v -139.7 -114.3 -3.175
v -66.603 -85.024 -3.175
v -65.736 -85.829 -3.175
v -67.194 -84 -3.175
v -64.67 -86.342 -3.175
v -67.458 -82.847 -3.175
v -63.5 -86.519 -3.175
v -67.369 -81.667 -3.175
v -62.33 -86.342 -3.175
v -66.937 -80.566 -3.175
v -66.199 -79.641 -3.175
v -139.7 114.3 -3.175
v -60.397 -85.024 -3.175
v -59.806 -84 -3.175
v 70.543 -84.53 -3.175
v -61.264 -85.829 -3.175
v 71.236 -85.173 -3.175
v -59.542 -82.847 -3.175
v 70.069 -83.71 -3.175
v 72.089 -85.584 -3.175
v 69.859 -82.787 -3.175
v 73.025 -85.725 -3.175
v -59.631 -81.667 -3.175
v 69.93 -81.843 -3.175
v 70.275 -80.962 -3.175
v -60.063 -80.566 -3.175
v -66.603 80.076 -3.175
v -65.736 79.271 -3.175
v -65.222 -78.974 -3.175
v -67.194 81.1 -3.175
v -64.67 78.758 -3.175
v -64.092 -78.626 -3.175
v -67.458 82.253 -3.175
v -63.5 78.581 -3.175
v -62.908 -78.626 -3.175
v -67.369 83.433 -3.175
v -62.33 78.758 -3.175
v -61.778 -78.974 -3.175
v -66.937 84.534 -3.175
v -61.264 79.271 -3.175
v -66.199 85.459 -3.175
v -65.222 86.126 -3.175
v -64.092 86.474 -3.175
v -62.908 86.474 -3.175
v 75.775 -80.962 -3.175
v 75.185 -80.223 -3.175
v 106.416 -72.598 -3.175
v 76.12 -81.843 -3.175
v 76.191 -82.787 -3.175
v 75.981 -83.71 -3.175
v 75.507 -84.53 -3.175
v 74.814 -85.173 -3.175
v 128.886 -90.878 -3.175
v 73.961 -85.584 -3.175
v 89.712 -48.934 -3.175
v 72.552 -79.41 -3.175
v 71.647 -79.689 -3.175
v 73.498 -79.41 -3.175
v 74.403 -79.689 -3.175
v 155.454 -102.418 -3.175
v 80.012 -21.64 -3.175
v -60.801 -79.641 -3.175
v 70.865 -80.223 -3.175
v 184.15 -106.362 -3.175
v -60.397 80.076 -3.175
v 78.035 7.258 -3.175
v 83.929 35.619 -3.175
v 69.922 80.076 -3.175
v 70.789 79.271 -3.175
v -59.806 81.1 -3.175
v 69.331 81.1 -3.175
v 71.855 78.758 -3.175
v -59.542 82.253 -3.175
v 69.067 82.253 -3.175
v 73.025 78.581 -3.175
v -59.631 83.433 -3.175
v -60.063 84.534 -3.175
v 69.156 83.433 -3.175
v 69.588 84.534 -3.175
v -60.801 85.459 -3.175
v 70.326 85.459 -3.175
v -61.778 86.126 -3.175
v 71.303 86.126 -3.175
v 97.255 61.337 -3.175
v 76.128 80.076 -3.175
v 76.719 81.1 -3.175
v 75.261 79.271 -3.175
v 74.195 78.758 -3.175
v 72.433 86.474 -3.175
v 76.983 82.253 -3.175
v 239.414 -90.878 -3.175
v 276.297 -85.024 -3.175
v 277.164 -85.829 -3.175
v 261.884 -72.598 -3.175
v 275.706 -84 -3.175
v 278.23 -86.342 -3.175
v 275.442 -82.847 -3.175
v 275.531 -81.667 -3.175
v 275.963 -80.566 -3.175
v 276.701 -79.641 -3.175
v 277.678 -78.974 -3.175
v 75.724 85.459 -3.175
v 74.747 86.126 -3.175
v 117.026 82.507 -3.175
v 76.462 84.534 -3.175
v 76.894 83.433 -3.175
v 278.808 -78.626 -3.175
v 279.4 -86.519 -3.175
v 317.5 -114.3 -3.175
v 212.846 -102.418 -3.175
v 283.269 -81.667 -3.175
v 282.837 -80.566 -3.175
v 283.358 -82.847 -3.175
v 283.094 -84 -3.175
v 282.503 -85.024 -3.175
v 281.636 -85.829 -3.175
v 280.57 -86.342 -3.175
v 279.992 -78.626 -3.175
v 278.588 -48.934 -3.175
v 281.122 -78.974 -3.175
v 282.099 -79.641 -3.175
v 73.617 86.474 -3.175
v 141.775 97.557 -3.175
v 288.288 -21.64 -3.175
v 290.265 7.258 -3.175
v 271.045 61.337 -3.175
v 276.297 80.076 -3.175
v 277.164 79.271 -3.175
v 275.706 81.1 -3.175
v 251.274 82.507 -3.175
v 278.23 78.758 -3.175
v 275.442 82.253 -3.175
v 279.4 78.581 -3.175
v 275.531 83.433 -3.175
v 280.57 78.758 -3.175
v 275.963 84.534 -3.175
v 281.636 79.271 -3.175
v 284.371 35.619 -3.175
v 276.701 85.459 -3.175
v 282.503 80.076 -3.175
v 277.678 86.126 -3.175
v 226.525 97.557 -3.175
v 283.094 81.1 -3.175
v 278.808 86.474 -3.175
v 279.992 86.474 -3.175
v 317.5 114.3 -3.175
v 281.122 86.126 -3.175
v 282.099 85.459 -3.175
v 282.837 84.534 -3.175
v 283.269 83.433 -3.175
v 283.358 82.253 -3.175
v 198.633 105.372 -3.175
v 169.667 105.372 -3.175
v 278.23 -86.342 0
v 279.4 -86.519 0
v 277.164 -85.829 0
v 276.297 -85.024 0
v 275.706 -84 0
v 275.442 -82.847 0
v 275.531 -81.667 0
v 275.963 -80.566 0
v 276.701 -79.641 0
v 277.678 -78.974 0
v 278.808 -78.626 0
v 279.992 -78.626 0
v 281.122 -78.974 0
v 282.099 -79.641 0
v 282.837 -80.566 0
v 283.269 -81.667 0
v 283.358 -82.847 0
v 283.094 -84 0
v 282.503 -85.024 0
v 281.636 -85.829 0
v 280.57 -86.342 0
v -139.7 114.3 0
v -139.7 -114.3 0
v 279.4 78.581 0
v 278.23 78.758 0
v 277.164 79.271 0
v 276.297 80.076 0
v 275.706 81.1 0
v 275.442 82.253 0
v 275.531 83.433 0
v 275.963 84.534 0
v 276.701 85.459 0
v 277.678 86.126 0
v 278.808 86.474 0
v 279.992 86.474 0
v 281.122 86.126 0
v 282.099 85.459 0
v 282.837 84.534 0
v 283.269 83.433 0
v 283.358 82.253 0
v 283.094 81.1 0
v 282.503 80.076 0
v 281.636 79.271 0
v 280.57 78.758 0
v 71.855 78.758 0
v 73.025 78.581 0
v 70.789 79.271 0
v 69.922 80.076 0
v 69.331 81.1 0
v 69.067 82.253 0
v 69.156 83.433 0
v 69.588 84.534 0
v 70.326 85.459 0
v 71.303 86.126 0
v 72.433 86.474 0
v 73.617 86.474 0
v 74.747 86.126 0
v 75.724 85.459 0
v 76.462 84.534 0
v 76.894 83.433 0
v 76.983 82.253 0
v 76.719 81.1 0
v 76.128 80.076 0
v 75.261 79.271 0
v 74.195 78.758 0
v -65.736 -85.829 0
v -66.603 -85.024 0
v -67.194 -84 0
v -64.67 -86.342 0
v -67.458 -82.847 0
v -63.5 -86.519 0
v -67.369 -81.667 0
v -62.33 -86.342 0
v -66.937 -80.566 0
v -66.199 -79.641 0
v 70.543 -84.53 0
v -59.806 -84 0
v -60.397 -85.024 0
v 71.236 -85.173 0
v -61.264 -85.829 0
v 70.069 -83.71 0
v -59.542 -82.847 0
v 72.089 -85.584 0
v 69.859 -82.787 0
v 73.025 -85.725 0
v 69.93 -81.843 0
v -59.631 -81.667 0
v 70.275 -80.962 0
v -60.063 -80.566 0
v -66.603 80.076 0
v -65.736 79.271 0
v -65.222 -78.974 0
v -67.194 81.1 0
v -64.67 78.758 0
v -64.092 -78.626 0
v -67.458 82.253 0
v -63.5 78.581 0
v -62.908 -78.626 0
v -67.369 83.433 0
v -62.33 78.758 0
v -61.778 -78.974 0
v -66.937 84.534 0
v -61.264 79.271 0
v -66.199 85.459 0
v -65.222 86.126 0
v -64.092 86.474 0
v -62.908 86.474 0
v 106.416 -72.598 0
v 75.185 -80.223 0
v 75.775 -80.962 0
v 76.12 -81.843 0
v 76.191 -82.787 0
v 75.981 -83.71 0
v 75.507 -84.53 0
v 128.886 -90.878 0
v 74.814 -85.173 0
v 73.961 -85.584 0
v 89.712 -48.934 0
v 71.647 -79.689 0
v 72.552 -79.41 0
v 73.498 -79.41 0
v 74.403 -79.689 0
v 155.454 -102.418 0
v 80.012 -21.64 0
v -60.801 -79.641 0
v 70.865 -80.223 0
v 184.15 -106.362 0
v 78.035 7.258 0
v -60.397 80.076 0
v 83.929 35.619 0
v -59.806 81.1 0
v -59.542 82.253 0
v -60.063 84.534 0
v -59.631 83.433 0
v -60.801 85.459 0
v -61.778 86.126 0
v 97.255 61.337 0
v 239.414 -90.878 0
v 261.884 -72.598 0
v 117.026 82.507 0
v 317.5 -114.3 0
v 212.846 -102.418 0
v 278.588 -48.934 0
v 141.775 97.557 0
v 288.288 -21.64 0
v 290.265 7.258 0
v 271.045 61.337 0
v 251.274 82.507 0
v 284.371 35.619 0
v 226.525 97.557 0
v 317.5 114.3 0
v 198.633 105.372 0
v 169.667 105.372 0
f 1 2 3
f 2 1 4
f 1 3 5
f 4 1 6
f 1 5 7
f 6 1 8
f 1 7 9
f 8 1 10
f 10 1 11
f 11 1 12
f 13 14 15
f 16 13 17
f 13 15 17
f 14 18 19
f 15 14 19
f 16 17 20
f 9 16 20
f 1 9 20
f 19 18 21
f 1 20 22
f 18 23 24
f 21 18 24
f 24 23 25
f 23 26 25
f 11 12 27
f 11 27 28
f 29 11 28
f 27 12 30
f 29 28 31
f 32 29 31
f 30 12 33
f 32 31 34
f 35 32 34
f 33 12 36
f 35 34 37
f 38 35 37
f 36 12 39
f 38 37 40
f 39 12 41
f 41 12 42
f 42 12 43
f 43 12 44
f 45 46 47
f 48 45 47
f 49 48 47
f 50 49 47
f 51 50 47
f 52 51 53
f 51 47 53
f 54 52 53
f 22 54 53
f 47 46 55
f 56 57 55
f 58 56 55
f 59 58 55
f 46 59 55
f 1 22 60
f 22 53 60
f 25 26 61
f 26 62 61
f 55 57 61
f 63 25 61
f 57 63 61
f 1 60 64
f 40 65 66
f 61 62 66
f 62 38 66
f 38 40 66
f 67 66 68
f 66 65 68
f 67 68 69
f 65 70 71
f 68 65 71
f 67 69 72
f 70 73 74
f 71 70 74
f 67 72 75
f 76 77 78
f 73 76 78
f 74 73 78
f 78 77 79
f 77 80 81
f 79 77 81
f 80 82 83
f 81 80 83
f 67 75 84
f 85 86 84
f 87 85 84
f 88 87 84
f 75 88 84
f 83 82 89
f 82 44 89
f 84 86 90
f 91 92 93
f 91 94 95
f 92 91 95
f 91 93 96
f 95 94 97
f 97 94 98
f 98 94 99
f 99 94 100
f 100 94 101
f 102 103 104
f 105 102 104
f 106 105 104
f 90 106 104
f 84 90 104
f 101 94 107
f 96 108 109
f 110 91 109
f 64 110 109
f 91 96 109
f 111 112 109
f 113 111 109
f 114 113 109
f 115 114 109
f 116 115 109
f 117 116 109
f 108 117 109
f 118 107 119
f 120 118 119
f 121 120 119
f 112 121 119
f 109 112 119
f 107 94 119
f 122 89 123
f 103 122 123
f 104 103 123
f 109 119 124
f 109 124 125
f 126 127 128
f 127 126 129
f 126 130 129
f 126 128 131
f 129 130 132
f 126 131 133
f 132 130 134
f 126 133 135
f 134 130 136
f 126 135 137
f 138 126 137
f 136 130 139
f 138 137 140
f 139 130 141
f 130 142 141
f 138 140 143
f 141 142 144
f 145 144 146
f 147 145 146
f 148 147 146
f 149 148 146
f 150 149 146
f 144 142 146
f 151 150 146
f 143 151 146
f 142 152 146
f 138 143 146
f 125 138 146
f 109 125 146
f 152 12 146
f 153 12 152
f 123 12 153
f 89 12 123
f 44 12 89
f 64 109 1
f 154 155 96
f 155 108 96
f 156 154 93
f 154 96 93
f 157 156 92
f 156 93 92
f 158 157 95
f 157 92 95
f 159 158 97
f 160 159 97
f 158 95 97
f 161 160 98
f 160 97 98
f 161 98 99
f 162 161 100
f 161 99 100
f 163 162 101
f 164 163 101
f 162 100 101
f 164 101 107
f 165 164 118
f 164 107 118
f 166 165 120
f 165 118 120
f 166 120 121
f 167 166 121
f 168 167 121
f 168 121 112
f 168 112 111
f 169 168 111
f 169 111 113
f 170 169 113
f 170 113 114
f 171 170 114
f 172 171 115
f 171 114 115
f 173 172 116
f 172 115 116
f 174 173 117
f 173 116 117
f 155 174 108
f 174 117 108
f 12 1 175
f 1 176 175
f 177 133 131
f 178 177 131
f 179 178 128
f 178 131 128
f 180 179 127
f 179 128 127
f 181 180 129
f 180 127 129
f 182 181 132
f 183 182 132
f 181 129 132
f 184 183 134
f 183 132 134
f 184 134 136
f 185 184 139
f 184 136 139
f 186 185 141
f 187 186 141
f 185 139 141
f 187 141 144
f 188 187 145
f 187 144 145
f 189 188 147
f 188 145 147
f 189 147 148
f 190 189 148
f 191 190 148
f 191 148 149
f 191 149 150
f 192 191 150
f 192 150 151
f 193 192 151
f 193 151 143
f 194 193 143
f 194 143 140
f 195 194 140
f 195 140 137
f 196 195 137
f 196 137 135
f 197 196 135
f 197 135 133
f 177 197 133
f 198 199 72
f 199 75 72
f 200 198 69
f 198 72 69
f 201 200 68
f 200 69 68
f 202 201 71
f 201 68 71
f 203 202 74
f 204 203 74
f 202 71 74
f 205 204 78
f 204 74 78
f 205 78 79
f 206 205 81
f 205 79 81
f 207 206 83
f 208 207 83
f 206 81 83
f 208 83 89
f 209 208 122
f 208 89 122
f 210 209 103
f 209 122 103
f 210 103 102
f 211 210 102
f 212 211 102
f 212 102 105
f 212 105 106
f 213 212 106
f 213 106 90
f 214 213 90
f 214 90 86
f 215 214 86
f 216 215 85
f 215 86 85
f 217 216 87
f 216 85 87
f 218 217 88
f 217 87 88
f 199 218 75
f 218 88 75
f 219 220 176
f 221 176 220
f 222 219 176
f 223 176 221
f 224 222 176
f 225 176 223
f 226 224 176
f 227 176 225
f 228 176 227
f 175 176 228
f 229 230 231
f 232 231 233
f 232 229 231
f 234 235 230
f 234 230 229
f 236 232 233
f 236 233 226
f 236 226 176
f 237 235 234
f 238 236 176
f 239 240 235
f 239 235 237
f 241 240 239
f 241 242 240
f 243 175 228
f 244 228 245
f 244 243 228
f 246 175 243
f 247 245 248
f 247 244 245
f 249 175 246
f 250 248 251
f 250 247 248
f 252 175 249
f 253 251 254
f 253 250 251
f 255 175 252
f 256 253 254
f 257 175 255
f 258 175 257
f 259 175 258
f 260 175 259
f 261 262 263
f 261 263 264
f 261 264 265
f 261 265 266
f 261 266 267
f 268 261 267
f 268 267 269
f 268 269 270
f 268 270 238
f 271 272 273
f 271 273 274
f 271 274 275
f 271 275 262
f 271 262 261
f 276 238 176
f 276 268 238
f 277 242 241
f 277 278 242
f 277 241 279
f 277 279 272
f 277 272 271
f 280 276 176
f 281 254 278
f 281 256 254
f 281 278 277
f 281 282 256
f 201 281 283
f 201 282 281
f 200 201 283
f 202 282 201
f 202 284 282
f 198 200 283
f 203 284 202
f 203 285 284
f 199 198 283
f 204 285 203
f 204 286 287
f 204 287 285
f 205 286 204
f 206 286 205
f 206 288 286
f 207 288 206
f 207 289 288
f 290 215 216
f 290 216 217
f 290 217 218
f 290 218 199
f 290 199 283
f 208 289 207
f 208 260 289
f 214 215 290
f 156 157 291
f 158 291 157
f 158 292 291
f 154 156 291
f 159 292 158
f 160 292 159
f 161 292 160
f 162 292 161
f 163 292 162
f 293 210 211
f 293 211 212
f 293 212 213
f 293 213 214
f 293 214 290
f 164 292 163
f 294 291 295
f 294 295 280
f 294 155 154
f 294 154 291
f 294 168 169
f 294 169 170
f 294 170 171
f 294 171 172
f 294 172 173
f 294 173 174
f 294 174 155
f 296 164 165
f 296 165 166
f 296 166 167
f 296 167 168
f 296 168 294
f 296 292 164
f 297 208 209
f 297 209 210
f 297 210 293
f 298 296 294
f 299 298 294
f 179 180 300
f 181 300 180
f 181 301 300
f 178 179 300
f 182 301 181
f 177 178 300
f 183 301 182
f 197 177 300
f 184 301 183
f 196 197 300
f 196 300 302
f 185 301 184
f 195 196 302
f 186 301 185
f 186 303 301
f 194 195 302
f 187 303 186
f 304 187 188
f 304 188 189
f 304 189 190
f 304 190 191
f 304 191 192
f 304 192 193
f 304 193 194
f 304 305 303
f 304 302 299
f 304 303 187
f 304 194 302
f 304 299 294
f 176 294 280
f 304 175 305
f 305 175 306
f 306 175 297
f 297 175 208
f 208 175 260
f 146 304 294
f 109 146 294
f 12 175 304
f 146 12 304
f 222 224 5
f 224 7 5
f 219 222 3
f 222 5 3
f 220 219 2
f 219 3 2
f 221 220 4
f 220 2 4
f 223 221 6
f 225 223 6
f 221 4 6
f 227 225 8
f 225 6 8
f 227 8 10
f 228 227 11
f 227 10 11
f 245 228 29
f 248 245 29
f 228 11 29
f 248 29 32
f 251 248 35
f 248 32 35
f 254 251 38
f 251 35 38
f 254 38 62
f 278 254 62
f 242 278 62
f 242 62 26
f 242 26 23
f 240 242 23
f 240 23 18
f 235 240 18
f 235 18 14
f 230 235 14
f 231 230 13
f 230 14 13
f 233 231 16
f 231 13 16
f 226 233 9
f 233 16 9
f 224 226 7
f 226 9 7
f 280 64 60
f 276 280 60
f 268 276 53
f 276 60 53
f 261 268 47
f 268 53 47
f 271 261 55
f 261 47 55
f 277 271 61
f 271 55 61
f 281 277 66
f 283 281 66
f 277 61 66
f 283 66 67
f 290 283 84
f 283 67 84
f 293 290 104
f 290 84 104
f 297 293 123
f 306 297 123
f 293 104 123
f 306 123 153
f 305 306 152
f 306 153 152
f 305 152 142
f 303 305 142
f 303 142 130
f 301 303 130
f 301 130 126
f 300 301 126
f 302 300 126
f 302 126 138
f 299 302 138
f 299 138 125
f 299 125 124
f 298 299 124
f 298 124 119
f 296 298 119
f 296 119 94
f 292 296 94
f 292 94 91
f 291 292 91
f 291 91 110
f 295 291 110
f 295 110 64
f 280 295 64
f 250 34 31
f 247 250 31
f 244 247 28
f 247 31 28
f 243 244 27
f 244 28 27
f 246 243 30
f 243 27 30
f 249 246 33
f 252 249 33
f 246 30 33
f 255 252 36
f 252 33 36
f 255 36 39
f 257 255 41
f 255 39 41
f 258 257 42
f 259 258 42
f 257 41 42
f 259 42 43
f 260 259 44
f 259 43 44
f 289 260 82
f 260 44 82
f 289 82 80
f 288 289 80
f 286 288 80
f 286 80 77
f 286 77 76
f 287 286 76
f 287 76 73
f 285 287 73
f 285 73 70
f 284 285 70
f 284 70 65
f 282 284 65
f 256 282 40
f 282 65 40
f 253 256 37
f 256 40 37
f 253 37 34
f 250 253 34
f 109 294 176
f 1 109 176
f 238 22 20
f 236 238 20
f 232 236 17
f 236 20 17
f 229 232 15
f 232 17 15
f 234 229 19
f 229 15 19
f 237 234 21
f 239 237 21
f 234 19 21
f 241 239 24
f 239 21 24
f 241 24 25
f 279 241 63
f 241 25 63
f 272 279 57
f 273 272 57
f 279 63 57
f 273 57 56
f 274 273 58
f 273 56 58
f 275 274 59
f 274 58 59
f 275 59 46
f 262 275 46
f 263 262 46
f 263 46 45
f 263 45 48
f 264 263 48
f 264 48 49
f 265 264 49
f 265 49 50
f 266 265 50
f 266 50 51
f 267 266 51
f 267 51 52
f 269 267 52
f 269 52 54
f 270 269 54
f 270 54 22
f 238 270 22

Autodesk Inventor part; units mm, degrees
ref_plane "YZ Plane" through (0, 0, 0) normal (1, 0, 0) x (0, 1, 0)
ref_plane "XZ Plane" through (0, 0, 0) normal (0, 1, 0) x (-1, 0, 0)
ref_plane "XY Plane" through (0, 0, 0) normal (0, 0, 1) x (1, 0, 0)
sketch "Sketch1" plane through (0, 0, 0) normal (0, 0, 1) x (1, 0, 0)
  line L0 (-139.7, 114.3) -> (317.5, 114.3)
  line L1 (317.5, 114.3) -> (317.5, -114.3)
  line L2 (317.5, -114.3) -> (-139.7, -114.3)
  line L3 (-139.7, -114.3) -> (-139.7, 114.3)
  point P0 (0, 0)
  dimension "d0" = 457.2
  dimension "d1" = 228.6
  dimension "d2" = 114.3
  dimension "d3" = 139.7
extrude "Extrusion1" add sketch "Sketch1" against normal blind 3.175
hole "Hole1" at (184.15, 0, 0) direction (0, 0, -1) diameter 212.725 depth 25.4 tip angle 118
hole "Hole2" at (-63.5, 82.55, 0) direction (0, 0, -1) diameter 7.9375 depth 25.4 tip angle 118
hole "Hole3" at (-63.5, -82.55, 0) direction (0, 0, -1) diameter 7.9375 depth 25.4 tip angle 118
hole "Hole4" at (73.025, 82.55, 0) direction (0, 0, -1) diameter 7.9375 depth 25.4 tip angle 118
hole "Hole5" at (73.025, -82.55, 0) direction (0, 0, -1) diameter 6.35 depth 25.4 tip angle 118
hole "Hole6" at (279.4, 82.55, 0) direction (0, 0, -1) diameter 7.9375 depth 25.4 tip angle 118
hole "Hole7" at (279.4, -82.55, 0) direction (0, 0, -1) diameter 7.9375 depth 25.4 tip angle 118
properties part number "Fore_Base"
